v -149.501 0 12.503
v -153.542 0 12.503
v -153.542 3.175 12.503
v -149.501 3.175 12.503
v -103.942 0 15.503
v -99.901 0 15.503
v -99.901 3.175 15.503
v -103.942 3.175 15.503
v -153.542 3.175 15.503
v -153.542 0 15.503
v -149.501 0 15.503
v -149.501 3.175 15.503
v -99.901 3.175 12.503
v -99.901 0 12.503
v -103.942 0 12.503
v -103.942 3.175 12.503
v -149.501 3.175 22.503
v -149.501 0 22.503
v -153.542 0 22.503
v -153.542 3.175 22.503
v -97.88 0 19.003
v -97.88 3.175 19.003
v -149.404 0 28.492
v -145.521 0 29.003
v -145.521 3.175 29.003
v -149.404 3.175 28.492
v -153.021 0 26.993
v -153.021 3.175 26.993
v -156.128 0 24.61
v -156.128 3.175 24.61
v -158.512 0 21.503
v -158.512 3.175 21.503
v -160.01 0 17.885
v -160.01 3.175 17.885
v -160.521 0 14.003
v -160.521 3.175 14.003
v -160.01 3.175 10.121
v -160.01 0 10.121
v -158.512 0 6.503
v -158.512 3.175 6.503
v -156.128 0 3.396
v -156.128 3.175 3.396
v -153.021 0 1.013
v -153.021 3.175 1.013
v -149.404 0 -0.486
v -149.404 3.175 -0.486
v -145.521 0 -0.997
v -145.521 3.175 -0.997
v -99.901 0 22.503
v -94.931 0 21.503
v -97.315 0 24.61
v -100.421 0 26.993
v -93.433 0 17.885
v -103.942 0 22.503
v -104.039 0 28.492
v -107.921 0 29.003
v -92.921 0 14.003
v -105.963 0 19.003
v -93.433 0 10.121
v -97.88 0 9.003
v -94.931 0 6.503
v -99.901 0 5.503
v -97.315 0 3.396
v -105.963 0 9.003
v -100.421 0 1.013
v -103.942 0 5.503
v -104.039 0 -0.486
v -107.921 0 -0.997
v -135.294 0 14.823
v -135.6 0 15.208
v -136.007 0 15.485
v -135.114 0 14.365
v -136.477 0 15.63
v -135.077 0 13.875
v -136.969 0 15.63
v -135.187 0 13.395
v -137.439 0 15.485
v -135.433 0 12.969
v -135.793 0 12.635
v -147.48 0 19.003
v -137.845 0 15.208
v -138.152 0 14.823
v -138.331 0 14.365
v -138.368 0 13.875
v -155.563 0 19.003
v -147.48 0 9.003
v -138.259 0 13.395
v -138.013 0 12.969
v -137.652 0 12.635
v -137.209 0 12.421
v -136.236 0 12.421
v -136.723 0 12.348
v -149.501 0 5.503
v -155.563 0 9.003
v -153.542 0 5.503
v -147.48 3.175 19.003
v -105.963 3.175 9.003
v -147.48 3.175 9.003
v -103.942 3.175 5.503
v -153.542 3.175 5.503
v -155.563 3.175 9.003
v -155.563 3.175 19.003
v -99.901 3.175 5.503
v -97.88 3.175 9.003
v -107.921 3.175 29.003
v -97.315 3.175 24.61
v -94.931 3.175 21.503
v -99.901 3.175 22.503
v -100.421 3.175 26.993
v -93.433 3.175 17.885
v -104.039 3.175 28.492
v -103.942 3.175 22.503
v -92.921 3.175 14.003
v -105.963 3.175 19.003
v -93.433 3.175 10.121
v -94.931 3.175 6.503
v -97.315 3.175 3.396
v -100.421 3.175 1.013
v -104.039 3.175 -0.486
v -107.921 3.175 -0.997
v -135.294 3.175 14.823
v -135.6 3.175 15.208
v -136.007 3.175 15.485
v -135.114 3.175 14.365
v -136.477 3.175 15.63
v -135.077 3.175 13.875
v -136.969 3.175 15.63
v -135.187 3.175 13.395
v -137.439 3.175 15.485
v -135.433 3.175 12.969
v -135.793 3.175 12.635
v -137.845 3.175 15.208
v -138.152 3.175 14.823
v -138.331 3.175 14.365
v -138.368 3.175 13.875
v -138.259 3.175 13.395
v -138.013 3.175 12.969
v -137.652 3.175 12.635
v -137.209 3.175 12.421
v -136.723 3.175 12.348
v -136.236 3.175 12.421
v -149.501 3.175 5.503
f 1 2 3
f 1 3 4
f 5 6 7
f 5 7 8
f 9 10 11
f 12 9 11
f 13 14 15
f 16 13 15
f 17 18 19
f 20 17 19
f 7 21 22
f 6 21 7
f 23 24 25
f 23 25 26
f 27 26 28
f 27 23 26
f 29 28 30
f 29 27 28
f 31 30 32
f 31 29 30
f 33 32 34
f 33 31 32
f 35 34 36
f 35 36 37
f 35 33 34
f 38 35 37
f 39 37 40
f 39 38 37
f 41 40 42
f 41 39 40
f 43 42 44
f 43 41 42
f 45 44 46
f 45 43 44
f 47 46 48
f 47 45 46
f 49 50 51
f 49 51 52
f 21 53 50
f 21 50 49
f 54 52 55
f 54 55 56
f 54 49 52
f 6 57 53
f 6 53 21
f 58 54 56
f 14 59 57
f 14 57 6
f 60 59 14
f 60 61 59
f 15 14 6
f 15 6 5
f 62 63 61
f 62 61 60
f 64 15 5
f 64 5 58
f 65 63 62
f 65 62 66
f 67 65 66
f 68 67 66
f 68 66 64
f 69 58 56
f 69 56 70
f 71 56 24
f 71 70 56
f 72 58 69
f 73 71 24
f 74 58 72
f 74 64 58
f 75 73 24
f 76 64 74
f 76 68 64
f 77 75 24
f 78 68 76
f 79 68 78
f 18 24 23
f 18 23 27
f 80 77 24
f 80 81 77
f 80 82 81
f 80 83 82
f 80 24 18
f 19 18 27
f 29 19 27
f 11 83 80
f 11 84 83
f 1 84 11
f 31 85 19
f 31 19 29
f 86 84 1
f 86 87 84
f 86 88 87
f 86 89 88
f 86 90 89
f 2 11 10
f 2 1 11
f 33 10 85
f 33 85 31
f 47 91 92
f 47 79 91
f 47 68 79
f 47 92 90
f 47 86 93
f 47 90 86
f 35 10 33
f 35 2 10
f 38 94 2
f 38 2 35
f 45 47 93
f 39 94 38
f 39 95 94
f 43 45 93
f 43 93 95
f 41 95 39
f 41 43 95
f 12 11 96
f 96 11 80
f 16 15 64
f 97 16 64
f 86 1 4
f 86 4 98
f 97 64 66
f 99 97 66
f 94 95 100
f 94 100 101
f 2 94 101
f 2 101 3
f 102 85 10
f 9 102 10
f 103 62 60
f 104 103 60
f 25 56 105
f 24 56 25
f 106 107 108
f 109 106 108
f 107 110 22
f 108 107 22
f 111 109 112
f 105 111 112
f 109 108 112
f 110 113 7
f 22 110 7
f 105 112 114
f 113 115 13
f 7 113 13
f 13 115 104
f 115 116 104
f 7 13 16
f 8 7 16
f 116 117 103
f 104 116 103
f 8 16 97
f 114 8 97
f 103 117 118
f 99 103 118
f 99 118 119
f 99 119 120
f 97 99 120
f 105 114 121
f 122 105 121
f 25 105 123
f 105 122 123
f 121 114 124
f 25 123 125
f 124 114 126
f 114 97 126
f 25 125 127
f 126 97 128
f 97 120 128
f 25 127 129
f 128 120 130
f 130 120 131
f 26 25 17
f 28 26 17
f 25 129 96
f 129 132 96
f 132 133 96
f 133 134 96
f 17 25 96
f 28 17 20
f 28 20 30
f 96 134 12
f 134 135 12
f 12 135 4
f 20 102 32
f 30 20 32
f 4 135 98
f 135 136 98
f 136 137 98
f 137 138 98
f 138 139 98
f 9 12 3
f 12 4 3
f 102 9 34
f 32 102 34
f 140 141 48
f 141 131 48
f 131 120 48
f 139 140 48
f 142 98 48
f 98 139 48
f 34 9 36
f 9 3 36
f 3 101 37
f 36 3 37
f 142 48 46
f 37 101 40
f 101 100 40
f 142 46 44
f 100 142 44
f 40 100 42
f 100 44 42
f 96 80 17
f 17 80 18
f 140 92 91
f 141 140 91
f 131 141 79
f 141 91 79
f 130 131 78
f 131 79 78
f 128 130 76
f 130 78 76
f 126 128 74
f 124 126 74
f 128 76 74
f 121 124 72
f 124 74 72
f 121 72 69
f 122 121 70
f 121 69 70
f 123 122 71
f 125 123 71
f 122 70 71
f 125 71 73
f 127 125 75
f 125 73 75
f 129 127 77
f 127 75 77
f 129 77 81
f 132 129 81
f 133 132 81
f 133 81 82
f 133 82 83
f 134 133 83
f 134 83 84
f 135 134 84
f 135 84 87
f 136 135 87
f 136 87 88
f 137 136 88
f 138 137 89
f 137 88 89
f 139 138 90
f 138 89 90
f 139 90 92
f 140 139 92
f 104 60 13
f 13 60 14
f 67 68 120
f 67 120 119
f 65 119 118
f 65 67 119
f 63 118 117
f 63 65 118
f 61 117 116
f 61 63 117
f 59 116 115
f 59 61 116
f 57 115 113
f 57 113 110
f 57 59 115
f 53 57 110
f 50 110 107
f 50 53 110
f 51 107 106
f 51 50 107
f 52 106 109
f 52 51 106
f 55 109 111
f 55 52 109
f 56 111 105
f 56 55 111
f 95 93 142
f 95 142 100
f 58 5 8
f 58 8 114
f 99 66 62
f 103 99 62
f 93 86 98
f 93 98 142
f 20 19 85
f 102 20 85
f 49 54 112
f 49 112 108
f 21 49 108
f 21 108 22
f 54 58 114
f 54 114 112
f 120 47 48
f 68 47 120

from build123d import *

# Parameters (mm, degrees)
BOSS_EXTRUDE1_DEPTH = 3.175
SKETCH3_R           = 1.65
CUT_EXTRUDE1_DEPTH  = 3.175


with BuildPart() as part:
    # Sketch2 → Boss-Extrude1 (new body)
    with BuildSketch(Plane(origin=(0, 0, 0), x_dir=(1, 0, 0), z_dir=(0, 1, 0))):
        with BuildLine():
            Line((-145.521414695, 0.997059393), (-107.921414695, 0.997059393))
            ThreePointArc((-107.921414695, 0.997059393), (-92.921414695, -14.002940607), (-107.921414695, -29.002940607))
            Line((-107.921414695, -29.002940607), (-145.521414695, -29.002940607))
            ThreePointArc((-145.521414695, -29.002940607), (-160.521414695, -14.002940607), (-145.521414695, 0.997059393))
        make_face()
        Polygon((-149.500688753, -12.502940607), (-147.479962811, -9.002940607), (-149.500688753, -5.502940607), (-153.542140637, -5.502940607), (-155.562866579, -9.002940607), (-153.542140637, -12.502940607), align=None, mode=Mode.SUBTRACT)
        Polygon((-153.542140637, -15.502940607), (-149.500688753, -15.502940607), (-147.479962811, -19.002940607), (-149.500688753, -22.502940607), (-153.542140637, -22.502940607), (-155.562866579, -19.002940607), align=None, mode=Mode.SUBTRACT)
        Polygon((-103.942140637, -15.502940607), (-105.962866579, -19.002940607), (-103.942140637, -22.502940607), (-99.900688753, -22.502940607), (-97.879962811, -19.002940607), (-99.900688753, -15.502940607), align=None, mode=Mode.SUBTRACT)
        Polygon((-99.900688753, -12.502940607), (-103.942140637, -12.502940607), (-105.962866579, -9.002940607), (-103.942140637, -5.502940607), (-99.900688753, -5.502940607), (-97.879962811, -9.002940607), align=None, mode=Mode.SUBTRACT)
    extrude(amount=BOSS_EXTRUDE1_DEPTH)

    # Sketch3 → Cut-Extrude1 (cut)
    with BuildSketch(Plane.XZ):
        with Locations(Location((-136.722782871, 13.998131439, 0), (0, 0, 270))):
            Circle(SKETCH3_R)
    extrude(amount=-CUT_EXTRUDE1_DEPTH, mode=Mode.SUBTRACT)


solid = part.part
